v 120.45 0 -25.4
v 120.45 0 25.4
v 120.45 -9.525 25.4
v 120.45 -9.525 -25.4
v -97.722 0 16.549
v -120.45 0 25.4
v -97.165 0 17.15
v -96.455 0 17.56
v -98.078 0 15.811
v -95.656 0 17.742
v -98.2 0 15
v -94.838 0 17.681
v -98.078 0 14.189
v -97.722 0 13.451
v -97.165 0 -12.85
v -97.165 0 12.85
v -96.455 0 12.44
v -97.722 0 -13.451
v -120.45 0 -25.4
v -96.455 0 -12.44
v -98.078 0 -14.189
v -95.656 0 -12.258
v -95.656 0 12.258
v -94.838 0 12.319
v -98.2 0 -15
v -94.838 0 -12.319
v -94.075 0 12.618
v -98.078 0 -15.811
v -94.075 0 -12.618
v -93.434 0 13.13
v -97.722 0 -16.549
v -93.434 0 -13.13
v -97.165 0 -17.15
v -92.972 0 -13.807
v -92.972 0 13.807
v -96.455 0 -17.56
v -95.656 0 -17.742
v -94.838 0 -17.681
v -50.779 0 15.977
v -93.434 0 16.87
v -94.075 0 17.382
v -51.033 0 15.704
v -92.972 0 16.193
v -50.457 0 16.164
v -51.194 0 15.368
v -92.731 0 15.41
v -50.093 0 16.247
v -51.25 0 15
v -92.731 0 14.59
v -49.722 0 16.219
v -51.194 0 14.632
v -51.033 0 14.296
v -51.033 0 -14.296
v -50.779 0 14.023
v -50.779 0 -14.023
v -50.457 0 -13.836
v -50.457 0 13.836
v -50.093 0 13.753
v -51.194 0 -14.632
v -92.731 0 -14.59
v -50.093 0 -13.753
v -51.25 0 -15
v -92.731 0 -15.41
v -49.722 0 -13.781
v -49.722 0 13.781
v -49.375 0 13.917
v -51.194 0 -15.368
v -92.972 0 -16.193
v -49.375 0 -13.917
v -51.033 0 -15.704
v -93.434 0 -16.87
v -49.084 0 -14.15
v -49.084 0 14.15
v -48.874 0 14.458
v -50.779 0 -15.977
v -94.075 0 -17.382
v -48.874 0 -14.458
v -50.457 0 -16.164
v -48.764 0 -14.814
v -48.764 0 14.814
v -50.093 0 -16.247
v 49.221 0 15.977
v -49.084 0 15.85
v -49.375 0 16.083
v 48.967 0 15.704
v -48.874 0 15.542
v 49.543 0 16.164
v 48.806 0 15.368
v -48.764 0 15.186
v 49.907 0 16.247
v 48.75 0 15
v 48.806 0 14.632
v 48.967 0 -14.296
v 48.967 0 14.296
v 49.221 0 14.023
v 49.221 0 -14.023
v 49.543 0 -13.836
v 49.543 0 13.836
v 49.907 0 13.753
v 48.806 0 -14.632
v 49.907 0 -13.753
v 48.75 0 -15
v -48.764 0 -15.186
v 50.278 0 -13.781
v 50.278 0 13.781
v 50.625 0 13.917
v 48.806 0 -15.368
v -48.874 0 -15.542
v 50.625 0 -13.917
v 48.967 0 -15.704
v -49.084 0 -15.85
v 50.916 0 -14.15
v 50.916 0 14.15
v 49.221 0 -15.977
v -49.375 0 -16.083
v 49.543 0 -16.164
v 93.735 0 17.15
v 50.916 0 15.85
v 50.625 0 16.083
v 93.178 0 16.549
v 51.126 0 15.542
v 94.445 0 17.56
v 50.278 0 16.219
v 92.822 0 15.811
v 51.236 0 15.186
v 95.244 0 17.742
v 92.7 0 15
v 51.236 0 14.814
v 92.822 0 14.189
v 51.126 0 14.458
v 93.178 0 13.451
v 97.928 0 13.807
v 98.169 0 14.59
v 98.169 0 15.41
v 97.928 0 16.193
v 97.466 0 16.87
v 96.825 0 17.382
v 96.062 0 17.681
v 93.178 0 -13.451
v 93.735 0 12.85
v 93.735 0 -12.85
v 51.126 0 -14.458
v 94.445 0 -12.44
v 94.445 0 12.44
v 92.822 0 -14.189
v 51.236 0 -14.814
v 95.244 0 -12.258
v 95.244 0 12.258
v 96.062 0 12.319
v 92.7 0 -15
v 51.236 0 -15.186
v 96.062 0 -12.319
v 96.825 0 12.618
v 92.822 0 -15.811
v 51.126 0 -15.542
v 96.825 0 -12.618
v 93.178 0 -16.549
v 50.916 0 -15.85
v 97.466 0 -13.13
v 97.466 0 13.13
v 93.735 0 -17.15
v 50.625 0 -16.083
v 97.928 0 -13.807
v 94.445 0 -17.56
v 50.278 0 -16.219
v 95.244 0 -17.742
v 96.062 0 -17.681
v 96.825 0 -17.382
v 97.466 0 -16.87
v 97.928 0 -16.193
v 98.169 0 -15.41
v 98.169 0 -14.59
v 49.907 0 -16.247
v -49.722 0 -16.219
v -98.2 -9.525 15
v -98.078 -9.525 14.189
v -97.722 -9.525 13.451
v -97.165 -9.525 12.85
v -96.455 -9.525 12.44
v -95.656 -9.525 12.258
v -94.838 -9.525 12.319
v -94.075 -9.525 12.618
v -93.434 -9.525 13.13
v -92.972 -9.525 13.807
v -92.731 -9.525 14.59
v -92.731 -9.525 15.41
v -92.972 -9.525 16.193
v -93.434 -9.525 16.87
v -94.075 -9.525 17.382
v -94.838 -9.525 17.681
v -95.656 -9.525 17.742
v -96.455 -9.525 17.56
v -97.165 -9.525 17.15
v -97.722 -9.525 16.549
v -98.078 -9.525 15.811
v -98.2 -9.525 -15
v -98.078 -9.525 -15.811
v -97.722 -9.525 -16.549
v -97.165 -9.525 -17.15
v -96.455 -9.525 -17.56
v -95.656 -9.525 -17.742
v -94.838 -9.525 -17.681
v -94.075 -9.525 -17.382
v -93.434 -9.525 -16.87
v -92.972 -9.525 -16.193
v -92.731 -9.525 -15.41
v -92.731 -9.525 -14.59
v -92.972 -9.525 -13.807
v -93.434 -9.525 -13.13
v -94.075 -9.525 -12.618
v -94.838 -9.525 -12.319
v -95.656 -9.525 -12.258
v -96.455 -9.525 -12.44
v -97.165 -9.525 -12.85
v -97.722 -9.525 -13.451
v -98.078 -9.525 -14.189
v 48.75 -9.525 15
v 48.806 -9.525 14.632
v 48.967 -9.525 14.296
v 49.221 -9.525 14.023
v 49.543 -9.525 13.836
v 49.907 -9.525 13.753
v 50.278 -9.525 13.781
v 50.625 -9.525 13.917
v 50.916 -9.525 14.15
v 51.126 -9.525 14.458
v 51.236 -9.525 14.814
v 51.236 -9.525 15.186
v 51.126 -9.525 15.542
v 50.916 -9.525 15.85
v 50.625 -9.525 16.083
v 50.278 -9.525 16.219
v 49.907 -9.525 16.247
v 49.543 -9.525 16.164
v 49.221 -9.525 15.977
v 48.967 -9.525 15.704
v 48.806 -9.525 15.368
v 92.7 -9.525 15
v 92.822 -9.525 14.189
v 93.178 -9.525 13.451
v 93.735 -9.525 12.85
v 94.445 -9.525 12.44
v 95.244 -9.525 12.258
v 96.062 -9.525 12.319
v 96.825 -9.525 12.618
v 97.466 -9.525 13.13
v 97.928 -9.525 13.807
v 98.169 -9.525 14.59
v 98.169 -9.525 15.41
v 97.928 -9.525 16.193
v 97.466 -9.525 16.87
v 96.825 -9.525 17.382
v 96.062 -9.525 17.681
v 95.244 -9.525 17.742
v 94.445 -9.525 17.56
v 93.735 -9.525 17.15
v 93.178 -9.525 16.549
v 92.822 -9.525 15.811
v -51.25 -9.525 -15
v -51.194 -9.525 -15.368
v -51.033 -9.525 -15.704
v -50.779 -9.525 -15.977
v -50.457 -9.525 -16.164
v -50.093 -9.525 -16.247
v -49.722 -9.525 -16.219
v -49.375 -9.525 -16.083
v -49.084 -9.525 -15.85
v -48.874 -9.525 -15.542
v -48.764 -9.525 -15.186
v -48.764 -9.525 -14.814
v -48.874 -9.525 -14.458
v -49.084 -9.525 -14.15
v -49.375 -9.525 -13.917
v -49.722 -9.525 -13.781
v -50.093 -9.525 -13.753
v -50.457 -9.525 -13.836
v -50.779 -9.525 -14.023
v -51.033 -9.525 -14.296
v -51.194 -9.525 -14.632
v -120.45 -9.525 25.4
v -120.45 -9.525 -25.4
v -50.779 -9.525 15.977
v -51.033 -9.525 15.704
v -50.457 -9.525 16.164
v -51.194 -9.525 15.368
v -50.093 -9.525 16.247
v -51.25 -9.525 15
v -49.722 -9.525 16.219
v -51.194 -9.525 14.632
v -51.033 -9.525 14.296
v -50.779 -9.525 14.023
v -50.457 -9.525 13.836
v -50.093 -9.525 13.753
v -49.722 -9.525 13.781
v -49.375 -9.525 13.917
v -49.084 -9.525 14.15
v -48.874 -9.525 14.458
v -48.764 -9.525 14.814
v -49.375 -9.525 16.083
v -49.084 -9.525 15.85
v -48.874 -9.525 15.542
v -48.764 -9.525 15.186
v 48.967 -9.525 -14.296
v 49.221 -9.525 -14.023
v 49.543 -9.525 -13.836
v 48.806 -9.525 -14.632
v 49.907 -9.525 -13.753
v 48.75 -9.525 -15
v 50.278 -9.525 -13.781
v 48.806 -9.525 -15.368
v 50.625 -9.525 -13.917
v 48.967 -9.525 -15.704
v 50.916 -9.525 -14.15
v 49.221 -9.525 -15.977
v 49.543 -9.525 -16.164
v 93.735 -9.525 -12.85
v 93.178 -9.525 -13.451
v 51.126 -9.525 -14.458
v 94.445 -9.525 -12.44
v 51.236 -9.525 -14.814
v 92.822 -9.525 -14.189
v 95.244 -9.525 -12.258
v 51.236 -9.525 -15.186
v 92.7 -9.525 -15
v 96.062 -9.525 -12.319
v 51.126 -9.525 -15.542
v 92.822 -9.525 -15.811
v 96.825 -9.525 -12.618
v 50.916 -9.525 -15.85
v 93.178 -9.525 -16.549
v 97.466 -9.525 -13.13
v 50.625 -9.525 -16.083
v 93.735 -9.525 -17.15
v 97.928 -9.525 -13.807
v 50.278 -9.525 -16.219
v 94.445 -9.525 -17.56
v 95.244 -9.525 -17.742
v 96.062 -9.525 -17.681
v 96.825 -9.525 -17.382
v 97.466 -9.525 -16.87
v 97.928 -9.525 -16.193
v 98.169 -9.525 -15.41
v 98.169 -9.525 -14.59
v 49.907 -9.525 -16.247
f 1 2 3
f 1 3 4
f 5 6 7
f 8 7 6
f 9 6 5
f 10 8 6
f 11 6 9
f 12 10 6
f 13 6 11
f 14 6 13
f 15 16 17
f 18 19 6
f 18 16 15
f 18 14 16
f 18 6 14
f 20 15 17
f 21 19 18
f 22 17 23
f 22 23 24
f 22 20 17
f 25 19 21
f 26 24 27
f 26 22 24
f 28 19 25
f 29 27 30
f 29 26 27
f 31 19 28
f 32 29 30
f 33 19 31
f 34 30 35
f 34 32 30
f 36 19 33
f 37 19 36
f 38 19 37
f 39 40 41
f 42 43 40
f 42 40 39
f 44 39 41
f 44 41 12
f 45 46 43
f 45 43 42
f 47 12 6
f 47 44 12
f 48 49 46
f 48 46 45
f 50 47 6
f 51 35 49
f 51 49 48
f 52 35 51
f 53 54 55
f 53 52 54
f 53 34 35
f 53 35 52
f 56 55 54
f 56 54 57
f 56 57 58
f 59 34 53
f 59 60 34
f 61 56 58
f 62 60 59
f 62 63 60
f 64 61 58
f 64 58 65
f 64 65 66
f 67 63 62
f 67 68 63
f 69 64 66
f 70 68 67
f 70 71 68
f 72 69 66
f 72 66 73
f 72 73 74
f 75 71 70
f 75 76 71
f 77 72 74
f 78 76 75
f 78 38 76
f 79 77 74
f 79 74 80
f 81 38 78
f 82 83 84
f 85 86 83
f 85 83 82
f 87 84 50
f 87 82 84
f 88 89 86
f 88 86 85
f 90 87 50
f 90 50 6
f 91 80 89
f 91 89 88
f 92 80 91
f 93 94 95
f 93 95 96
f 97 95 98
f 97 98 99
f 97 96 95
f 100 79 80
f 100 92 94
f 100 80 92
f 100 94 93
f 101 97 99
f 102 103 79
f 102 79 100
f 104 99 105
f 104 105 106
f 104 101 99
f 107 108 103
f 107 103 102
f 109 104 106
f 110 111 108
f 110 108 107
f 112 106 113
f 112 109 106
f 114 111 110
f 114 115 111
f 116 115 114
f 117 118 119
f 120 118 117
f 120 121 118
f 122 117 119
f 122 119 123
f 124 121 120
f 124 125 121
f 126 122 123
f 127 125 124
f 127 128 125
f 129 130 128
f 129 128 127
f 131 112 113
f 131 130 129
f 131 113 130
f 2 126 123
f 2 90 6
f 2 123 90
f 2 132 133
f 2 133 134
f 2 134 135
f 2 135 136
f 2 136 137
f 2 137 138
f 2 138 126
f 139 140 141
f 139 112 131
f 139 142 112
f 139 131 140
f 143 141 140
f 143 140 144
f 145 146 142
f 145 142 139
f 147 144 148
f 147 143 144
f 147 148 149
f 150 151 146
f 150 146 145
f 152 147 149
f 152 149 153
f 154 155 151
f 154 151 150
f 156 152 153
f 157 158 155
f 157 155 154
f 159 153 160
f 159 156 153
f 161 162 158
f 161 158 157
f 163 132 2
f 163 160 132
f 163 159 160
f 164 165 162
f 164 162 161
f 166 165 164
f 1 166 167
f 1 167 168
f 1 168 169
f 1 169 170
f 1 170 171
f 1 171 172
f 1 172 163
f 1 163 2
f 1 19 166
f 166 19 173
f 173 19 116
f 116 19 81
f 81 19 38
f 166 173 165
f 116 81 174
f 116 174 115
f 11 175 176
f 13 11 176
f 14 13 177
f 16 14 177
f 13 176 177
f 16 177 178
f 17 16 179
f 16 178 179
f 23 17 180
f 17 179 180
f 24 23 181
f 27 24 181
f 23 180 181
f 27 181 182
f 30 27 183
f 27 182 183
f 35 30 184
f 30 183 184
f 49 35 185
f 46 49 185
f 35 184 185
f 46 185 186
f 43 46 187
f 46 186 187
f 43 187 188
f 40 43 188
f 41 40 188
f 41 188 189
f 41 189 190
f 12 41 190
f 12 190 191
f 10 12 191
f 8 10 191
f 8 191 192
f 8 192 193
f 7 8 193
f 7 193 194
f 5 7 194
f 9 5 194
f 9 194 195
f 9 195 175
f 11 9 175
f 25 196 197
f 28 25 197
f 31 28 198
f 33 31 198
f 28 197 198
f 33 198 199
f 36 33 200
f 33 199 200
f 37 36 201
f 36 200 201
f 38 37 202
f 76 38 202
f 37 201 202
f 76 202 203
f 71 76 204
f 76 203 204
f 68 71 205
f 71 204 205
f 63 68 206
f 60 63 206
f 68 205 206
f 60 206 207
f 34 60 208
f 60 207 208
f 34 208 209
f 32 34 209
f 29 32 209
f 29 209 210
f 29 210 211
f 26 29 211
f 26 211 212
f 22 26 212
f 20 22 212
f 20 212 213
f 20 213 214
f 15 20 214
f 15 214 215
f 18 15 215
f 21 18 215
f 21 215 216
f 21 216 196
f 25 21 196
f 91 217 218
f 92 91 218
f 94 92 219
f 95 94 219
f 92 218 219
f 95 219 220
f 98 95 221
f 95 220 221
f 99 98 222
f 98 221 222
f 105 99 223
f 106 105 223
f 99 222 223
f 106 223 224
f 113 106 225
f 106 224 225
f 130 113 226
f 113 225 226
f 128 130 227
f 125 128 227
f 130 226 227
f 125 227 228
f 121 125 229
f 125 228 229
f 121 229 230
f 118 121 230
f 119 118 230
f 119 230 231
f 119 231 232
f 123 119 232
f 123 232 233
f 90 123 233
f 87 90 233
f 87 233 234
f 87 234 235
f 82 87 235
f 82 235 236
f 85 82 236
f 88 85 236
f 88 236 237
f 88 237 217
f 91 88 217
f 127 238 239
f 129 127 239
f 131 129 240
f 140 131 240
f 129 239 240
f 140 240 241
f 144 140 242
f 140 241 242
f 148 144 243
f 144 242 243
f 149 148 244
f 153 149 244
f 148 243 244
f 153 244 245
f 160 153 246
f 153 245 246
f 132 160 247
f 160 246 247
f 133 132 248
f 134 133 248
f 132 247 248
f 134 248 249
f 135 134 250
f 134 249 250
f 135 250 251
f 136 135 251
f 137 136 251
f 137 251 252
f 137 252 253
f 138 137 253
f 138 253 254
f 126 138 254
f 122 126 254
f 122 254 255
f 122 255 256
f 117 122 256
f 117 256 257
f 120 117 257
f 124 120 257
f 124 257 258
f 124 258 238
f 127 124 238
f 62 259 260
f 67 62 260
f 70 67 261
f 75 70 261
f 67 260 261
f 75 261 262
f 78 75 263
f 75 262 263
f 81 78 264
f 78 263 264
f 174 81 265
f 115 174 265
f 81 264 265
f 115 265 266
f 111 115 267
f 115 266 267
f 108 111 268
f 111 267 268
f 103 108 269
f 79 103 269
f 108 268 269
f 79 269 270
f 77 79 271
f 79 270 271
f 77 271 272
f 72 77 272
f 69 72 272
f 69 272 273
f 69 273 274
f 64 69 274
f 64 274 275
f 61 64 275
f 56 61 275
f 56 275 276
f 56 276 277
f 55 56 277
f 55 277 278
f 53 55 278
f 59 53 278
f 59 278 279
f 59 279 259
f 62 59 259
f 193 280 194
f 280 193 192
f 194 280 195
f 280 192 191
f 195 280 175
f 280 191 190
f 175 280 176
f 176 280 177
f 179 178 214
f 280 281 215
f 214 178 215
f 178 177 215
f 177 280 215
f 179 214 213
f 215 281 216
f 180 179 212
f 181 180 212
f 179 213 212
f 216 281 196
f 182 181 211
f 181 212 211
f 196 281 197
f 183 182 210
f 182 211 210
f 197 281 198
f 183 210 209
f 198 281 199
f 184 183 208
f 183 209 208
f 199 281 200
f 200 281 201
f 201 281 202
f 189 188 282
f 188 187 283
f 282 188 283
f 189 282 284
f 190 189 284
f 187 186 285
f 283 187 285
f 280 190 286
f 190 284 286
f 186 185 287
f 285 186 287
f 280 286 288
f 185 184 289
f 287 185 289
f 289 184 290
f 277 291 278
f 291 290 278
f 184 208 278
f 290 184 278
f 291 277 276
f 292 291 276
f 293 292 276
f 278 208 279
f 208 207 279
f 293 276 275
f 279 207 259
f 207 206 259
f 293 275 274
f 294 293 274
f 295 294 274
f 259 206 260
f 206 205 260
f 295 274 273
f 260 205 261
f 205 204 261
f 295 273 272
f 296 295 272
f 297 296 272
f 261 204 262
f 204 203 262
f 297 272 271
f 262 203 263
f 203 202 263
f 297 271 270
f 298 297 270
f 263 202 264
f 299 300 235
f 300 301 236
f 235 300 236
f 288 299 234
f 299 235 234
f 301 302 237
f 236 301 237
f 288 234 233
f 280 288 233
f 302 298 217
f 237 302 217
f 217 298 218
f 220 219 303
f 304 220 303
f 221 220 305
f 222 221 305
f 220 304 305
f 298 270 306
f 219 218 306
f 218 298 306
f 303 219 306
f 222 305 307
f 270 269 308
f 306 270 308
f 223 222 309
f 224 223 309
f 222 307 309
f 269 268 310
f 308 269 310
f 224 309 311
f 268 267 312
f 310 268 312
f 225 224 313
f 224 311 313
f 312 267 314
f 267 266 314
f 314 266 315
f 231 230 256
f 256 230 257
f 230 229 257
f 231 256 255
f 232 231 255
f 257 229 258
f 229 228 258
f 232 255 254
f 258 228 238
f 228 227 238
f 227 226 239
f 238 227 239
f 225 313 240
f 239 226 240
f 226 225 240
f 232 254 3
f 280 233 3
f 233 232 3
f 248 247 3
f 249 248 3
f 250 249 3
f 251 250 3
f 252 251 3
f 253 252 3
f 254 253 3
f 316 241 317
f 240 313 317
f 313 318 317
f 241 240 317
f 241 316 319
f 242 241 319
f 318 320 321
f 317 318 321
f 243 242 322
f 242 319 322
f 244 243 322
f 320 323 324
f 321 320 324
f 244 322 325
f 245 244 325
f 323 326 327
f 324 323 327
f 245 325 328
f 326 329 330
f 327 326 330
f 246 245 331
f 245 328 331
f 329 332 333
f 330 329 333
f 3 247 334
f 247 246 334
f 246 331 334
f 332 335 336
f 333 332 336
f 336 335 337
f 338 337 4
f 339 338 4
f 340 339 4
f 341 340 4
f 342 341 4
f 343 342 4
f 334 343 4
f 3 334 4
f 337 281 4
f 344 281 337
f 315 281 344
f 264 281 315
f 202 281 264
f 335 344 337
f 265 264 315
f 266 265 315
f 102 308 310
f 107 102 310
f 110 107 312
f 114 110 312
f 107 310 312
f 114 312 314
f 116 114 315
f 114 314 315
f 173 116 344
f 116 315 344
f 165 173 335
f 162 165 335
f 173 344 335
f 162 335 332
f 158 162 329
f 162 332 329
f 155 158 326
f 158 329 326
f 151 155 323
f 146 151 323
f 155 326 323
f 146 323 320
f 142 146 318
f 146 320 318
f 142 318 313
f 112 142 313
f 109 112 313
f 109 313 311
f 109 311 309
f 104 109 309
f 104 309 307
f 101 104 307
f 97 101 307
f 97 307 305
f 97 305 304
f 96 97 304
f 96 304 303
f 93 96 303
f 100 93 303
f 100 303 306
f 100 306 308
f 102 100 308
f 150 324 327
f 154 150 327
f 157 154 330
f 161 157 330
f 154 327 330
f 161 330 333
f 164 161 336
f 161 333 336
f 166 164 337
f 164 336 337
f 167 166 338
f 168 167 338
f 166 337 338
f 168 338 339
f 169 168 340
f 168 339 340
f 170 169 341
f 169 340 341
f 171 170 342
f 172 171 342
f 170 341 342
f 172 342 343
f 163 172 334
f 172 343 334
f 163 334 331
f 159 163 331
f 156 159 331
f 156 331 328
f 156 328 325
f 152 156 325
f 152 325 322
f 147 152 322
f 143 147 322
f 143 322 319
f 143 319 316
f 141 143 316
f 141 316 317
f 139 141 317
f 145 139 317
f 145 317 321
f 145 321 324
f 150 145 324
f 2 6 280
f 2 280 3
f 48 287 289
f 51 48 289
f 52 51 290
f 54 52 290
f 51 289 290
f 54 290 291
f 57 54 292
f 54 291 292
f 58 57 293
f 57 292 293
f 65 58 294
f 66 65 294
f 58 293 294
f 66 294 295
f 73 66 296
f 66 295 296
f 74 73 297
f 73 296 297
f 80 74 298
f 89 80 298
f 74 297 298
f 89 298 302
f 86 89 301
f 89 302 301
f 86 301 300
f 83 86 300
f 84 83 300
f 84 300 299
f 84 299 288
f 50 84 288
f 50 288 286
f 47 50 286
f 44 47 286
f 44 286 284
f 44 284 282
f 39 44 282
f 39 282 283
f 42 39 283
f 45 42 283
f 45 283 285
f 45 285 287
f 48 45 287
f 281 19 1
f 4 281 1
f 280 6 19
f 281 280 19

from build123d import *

# Parameters (mm, degrees)
SKETCH1_W             = 240.9
SKETCH1_H             = 50.8
BOSS_EXTRUDE1_DEPTH   = 9.525
M3X0_5_TAPPED_HOLE1_D = 2.5
M5_CLEARANCE_HOLE1_D  = 5.5


with BuildPart() as part:
    # Sketch1 → Boss-Extrude1 (new body)
    with BuildSketch(Plane(origin=(0, 0, 0), x_dir=(1, 0, 0), z_dir=(0, 1, 0))):
        Rectangle(SKETCH1_W, SKETCH1_H)
    extrude(amount=-BOSS_EXTRUDE1_DEPTH)

    # M3x0.5 Tapped Hole1 (through all)
    with Locations(Plane(origin=(0, 0, 0), x_dir=(1, 0, 0), z_dir=(0, 1, 0))):
        with Locations((-50, 15), (-50, -15), (50, -15), (50, 15)):
            Hole(M3X0_5_TAPPED_HOLE1_D / 2)

    # M5 Clearance Hole1 (through all)
    with Locations(Plane(origin=(0, 0, 0), x_dir=(1, 0, 0), z_dir=(0, 1, 0))):
        with Locations((95.45, 15), (-95.45, 15), (-95.45, -15), (95.45, -15)):
            Hole(M5_CLEARANCE_HOLE1_D / 2)


solid = part.part
